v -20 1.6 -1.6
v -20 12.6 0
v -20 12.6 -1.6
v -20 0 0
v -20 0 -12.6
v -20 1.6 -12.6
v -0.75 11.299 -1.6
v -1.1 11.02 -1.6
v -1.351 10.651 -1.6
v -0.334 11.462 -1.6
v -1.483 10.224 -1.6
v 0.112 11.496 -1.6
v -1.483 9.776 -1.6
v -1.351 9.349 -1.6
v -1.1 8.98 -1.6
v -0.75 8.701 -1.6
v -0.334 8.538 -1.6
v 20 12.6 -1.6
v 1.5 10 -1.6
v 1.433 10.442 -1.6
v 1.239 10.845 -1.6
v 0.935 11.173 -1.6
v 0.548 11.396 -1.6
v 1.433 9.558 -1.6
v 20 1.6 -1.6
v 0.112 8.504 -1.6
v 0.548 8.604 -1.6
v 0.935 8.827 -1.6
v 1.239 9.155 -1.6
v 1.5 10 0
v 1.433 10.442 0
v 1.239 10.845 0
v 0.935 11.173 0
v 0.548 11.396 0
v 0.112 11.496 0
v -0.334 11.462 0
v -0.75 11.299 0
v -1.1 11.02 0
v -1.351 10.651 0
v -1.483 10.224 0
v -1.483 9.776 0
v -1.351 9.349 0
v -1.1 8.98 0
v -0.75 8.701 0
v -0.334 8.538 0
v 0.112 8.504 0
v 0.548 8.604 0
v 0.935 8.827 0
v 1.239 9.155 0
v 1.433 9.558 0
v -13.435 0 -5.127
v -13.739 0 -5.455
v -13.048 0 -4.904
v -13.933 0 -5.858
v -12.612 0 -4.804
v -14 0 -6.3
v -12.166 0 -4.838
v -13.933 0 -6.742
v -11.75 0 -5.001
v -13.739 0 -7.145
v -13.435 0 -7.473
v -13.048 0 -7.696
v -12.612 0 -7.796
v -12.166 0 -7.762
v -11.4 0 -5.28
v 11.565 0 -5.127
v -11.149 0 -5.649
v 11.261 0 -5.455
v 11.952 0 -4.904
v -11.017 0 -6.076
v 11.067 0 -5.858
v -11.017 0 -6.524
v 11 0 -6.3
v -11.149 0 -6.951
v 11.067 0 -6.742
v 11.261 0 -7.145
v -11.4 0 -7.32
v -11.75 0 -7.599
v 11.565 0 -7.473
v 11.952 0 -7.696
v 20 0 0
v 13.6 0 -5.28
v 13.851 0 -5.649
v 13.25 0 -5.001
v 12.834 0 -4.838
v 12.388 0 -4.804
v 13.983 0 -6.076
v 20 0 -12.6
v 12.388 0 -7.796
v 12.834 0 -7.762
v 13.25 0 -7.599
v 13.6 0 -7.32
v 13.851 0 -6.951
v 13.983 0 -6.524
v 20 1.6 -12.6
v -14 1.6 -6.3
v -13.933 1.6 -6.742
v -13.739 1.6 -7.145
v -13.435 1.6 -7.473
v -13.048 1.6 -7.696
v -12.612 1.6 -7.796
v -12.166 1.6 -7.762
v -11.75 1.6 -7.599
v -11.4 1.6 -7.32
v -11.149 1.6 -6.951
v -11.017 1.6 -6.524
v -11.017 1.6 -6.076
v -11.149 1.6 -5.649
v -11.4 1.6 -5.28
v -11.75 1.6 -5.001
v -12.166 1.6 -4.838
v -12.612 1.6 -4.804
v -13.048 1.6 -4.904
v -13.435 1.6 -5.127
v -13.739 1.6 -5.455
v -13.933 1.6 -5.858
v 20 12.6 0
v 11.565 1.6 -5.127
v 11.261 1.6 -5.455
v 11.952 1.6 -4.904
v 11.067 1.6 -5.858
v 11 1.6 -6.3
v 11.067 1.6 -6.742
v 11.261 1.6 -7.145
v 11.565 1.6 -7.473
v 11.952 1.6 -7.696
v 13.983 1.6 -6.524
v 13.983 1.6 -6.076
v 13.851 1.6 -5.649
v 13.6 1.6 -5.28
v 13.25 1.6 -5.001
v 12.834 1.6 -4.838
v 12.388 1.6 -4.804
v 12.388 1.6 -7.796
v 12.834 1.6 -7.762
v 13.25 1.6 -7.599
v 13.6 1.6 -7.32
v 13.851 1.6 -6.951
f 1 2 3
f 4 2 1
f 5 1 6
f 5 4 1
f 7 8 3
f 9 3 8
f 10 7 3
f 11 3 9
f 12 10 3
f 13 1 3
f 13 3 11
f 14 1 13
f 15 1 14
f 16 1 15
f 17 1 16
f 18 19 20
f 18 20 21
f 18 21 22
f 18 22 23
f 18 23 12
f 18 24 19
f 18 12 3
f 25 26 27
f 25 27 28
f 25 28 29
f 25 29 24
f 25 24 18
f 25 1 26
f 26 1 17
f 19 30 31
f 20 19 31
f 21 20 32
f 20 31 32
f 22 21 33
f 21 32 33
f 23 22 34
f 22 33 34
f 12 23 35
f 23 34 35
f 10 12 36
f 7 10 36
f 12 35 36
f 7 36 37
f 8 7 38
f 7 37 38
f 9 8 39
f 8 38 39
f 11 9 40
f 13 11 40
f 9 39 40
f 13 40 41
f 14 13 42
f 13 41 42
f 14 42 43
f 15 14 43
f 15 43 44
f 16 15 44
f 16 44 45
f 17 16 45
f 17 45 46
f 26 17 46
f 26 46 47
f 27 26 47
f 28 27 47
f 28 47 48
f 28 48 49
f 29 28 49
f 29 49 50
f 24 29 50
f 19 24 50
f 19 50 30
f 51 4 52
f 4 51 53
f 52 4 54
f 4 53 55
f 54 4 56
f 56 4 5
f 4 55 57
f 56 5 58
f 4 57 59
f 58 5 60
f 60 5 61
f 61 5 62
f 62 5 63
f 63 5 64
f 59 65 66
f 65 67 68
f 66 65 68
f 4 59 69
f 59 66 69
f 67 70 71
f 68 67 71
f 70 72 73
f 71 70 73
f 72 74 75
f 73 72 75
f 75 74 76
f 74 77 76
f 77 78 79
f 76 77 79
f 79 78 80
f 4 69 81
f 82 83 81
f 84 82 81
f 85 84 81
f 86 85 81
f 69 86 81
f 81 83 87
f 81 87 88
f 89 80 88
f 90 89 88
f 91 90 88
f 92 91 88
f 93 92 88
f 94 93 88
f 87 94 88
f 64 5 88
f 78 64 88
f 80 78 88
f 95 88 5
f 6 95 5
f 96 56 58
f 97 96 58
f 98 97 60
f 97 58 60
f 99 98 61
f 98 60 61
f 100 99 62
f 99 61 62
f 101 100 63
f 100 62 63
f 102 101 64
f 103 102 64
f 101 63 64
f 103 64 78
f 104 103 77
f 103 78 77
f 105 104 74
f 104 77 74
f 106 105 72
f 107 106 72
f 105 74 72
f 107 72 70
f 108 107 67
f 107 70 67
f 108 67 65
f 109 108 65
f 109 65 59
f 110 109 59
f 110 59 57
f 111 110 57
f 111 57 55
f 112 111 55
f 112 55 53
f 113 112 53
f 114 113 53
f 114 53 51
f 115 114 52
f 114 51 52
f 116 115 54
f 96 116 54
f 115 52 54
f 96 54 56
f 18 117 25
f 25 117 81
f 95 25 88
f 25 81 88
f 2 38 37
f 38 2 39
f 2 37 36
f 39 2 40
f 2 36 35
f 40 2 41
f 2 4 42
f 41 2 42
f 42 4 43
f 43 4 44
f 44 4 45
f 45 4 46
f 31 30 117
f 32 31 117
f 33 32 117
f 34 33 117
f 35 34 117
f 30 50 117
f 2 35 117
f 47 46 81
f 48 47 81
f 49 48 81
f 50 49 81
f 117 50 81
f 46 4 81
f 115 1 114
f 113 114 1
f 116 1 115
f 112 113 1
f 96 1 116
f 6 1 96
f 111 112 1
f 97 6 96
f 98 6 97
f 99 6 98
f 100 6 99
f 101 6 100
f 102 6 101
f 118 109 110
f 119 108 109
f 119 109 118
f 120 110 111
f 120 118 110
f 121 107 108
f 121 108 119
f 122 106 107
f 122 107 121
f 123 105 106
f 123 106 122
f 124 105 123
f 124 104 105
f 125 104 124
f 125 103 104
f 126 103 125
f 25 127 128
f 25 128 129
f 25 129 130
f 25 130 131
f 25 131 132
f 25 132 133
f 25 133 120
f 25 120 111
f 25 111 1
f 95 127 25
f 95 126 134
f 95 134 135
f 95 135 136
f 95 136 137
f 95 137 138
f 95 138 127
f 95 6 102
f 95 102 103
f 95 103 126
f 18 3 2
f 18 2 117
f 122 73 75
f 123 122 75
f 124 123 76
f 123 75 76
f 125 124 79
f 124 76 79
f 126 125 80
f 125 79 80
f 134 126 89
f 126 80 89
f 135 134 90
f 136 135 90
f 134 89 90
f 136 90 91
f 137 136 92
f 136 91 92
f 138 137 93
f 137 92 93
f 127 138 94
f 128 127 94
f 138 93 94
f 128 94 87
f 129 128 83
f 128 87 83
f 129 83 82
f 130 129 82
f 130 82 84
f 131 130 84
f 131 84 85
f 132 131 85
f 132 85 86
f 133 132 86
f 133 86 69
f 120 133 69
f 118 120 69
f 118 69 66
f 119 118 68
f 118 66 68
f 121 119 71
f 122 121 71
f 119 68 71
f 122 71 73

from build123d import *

# Parameters (mm, degrees)
BOSS_EXTRUDE1_DEPTH = 1.6
SKETCH3_W           = 40
SKETCH3_H           = 1.6
BOSS_EXTRUDE3_DEPTH = 11
SKETCH4_R           = 1.5
CUT_EXTRUDE2_DEPTH  = 27.786563796


with BuildPart() as part:
    # Sketch1 → Boss-Extrude1 (new body)
    with BuildSketch(Plane(origin=(0, 0, 0), x_dir=(1, 0, 0), z_dir=(0, 1, 0))):
        with BuildLine():
            Line((0, 0), (0, 6.3))
            Line((0, 6.3), (-11, 6.3))
            ThreePointArc((-11, 6.3), (-12.5, 4.8), (-14, 6.3))
            Line((-14, 6.3), (-20, 6.3))
            Line((-20, 6.3), (-20, 0))
            Line((-20, 0), (0, 0))
        make_face()
        with BuildLine():
            Line((20, 6.3), (14, 6.3))
            ThreePointArc((14, 6.3), (12.5, 4.8), (11, 6.3))
            Line((11, 6.3), (0, 6.3))
            Line((0, 6.3), (0, 0))
            Line((0, 0), (20, 0))
            Line((20, 0), (20, 6.3))
        make_face()
        with BuildLine():
            ThreePointArc((11, 6.3), (12.5, 7.8), (14, 6.3))
            Line((14, 6.3), (20, 6.3))
            Line((20, 6.3), (20, 12.6))
            Line((20, 12.6), (0, 12.6))
            Line((0, 12.6), (0, 6.3))
            Line((0, 6.3), (11, 6.3))
        make_face()
        with BuildLine():
            Line((-11, 6.3), (0, 6.3))
            Line((0, 6.3), (0, 12.6))
            Line((0, 12.6), (-20, 12.6))
            Line((-20, 12.6), (-20, 6.3))
            Line((-20, 6.3), (-14, 6.3))
            ThreePointArc((-14, 6.3), (-12.5, 7.8), (-11, 6.3))
        make_face()
    extrude(amount=BOSS_EXTRUDE1_DEPTH)

    # Sketch3 → Boss-Extrude3 (add)
    with BuildSketch(Plane(origin=(0, 1.6, 0), x_dir=(1, 0, 0), z_dir=(0, 1, 0))):
        with Locations((0, 0.8)):
            Rectangle(SKETCH3_W, SKETCH3_H)
    extrude(amount=BOSS_EXTRUDE3_DEPTH)

    # Sketch4 → Cut-Extrude2 (cut, through all)
    with BuildSketch(Plane.XY):
        with Locations((0, 10)):
            Circle(SKETCH4_R)
    extrude(amount=-CUT_EXTRUDE2_DEPTH, mode=Mode.SUBTRACT)


solid = part.part
